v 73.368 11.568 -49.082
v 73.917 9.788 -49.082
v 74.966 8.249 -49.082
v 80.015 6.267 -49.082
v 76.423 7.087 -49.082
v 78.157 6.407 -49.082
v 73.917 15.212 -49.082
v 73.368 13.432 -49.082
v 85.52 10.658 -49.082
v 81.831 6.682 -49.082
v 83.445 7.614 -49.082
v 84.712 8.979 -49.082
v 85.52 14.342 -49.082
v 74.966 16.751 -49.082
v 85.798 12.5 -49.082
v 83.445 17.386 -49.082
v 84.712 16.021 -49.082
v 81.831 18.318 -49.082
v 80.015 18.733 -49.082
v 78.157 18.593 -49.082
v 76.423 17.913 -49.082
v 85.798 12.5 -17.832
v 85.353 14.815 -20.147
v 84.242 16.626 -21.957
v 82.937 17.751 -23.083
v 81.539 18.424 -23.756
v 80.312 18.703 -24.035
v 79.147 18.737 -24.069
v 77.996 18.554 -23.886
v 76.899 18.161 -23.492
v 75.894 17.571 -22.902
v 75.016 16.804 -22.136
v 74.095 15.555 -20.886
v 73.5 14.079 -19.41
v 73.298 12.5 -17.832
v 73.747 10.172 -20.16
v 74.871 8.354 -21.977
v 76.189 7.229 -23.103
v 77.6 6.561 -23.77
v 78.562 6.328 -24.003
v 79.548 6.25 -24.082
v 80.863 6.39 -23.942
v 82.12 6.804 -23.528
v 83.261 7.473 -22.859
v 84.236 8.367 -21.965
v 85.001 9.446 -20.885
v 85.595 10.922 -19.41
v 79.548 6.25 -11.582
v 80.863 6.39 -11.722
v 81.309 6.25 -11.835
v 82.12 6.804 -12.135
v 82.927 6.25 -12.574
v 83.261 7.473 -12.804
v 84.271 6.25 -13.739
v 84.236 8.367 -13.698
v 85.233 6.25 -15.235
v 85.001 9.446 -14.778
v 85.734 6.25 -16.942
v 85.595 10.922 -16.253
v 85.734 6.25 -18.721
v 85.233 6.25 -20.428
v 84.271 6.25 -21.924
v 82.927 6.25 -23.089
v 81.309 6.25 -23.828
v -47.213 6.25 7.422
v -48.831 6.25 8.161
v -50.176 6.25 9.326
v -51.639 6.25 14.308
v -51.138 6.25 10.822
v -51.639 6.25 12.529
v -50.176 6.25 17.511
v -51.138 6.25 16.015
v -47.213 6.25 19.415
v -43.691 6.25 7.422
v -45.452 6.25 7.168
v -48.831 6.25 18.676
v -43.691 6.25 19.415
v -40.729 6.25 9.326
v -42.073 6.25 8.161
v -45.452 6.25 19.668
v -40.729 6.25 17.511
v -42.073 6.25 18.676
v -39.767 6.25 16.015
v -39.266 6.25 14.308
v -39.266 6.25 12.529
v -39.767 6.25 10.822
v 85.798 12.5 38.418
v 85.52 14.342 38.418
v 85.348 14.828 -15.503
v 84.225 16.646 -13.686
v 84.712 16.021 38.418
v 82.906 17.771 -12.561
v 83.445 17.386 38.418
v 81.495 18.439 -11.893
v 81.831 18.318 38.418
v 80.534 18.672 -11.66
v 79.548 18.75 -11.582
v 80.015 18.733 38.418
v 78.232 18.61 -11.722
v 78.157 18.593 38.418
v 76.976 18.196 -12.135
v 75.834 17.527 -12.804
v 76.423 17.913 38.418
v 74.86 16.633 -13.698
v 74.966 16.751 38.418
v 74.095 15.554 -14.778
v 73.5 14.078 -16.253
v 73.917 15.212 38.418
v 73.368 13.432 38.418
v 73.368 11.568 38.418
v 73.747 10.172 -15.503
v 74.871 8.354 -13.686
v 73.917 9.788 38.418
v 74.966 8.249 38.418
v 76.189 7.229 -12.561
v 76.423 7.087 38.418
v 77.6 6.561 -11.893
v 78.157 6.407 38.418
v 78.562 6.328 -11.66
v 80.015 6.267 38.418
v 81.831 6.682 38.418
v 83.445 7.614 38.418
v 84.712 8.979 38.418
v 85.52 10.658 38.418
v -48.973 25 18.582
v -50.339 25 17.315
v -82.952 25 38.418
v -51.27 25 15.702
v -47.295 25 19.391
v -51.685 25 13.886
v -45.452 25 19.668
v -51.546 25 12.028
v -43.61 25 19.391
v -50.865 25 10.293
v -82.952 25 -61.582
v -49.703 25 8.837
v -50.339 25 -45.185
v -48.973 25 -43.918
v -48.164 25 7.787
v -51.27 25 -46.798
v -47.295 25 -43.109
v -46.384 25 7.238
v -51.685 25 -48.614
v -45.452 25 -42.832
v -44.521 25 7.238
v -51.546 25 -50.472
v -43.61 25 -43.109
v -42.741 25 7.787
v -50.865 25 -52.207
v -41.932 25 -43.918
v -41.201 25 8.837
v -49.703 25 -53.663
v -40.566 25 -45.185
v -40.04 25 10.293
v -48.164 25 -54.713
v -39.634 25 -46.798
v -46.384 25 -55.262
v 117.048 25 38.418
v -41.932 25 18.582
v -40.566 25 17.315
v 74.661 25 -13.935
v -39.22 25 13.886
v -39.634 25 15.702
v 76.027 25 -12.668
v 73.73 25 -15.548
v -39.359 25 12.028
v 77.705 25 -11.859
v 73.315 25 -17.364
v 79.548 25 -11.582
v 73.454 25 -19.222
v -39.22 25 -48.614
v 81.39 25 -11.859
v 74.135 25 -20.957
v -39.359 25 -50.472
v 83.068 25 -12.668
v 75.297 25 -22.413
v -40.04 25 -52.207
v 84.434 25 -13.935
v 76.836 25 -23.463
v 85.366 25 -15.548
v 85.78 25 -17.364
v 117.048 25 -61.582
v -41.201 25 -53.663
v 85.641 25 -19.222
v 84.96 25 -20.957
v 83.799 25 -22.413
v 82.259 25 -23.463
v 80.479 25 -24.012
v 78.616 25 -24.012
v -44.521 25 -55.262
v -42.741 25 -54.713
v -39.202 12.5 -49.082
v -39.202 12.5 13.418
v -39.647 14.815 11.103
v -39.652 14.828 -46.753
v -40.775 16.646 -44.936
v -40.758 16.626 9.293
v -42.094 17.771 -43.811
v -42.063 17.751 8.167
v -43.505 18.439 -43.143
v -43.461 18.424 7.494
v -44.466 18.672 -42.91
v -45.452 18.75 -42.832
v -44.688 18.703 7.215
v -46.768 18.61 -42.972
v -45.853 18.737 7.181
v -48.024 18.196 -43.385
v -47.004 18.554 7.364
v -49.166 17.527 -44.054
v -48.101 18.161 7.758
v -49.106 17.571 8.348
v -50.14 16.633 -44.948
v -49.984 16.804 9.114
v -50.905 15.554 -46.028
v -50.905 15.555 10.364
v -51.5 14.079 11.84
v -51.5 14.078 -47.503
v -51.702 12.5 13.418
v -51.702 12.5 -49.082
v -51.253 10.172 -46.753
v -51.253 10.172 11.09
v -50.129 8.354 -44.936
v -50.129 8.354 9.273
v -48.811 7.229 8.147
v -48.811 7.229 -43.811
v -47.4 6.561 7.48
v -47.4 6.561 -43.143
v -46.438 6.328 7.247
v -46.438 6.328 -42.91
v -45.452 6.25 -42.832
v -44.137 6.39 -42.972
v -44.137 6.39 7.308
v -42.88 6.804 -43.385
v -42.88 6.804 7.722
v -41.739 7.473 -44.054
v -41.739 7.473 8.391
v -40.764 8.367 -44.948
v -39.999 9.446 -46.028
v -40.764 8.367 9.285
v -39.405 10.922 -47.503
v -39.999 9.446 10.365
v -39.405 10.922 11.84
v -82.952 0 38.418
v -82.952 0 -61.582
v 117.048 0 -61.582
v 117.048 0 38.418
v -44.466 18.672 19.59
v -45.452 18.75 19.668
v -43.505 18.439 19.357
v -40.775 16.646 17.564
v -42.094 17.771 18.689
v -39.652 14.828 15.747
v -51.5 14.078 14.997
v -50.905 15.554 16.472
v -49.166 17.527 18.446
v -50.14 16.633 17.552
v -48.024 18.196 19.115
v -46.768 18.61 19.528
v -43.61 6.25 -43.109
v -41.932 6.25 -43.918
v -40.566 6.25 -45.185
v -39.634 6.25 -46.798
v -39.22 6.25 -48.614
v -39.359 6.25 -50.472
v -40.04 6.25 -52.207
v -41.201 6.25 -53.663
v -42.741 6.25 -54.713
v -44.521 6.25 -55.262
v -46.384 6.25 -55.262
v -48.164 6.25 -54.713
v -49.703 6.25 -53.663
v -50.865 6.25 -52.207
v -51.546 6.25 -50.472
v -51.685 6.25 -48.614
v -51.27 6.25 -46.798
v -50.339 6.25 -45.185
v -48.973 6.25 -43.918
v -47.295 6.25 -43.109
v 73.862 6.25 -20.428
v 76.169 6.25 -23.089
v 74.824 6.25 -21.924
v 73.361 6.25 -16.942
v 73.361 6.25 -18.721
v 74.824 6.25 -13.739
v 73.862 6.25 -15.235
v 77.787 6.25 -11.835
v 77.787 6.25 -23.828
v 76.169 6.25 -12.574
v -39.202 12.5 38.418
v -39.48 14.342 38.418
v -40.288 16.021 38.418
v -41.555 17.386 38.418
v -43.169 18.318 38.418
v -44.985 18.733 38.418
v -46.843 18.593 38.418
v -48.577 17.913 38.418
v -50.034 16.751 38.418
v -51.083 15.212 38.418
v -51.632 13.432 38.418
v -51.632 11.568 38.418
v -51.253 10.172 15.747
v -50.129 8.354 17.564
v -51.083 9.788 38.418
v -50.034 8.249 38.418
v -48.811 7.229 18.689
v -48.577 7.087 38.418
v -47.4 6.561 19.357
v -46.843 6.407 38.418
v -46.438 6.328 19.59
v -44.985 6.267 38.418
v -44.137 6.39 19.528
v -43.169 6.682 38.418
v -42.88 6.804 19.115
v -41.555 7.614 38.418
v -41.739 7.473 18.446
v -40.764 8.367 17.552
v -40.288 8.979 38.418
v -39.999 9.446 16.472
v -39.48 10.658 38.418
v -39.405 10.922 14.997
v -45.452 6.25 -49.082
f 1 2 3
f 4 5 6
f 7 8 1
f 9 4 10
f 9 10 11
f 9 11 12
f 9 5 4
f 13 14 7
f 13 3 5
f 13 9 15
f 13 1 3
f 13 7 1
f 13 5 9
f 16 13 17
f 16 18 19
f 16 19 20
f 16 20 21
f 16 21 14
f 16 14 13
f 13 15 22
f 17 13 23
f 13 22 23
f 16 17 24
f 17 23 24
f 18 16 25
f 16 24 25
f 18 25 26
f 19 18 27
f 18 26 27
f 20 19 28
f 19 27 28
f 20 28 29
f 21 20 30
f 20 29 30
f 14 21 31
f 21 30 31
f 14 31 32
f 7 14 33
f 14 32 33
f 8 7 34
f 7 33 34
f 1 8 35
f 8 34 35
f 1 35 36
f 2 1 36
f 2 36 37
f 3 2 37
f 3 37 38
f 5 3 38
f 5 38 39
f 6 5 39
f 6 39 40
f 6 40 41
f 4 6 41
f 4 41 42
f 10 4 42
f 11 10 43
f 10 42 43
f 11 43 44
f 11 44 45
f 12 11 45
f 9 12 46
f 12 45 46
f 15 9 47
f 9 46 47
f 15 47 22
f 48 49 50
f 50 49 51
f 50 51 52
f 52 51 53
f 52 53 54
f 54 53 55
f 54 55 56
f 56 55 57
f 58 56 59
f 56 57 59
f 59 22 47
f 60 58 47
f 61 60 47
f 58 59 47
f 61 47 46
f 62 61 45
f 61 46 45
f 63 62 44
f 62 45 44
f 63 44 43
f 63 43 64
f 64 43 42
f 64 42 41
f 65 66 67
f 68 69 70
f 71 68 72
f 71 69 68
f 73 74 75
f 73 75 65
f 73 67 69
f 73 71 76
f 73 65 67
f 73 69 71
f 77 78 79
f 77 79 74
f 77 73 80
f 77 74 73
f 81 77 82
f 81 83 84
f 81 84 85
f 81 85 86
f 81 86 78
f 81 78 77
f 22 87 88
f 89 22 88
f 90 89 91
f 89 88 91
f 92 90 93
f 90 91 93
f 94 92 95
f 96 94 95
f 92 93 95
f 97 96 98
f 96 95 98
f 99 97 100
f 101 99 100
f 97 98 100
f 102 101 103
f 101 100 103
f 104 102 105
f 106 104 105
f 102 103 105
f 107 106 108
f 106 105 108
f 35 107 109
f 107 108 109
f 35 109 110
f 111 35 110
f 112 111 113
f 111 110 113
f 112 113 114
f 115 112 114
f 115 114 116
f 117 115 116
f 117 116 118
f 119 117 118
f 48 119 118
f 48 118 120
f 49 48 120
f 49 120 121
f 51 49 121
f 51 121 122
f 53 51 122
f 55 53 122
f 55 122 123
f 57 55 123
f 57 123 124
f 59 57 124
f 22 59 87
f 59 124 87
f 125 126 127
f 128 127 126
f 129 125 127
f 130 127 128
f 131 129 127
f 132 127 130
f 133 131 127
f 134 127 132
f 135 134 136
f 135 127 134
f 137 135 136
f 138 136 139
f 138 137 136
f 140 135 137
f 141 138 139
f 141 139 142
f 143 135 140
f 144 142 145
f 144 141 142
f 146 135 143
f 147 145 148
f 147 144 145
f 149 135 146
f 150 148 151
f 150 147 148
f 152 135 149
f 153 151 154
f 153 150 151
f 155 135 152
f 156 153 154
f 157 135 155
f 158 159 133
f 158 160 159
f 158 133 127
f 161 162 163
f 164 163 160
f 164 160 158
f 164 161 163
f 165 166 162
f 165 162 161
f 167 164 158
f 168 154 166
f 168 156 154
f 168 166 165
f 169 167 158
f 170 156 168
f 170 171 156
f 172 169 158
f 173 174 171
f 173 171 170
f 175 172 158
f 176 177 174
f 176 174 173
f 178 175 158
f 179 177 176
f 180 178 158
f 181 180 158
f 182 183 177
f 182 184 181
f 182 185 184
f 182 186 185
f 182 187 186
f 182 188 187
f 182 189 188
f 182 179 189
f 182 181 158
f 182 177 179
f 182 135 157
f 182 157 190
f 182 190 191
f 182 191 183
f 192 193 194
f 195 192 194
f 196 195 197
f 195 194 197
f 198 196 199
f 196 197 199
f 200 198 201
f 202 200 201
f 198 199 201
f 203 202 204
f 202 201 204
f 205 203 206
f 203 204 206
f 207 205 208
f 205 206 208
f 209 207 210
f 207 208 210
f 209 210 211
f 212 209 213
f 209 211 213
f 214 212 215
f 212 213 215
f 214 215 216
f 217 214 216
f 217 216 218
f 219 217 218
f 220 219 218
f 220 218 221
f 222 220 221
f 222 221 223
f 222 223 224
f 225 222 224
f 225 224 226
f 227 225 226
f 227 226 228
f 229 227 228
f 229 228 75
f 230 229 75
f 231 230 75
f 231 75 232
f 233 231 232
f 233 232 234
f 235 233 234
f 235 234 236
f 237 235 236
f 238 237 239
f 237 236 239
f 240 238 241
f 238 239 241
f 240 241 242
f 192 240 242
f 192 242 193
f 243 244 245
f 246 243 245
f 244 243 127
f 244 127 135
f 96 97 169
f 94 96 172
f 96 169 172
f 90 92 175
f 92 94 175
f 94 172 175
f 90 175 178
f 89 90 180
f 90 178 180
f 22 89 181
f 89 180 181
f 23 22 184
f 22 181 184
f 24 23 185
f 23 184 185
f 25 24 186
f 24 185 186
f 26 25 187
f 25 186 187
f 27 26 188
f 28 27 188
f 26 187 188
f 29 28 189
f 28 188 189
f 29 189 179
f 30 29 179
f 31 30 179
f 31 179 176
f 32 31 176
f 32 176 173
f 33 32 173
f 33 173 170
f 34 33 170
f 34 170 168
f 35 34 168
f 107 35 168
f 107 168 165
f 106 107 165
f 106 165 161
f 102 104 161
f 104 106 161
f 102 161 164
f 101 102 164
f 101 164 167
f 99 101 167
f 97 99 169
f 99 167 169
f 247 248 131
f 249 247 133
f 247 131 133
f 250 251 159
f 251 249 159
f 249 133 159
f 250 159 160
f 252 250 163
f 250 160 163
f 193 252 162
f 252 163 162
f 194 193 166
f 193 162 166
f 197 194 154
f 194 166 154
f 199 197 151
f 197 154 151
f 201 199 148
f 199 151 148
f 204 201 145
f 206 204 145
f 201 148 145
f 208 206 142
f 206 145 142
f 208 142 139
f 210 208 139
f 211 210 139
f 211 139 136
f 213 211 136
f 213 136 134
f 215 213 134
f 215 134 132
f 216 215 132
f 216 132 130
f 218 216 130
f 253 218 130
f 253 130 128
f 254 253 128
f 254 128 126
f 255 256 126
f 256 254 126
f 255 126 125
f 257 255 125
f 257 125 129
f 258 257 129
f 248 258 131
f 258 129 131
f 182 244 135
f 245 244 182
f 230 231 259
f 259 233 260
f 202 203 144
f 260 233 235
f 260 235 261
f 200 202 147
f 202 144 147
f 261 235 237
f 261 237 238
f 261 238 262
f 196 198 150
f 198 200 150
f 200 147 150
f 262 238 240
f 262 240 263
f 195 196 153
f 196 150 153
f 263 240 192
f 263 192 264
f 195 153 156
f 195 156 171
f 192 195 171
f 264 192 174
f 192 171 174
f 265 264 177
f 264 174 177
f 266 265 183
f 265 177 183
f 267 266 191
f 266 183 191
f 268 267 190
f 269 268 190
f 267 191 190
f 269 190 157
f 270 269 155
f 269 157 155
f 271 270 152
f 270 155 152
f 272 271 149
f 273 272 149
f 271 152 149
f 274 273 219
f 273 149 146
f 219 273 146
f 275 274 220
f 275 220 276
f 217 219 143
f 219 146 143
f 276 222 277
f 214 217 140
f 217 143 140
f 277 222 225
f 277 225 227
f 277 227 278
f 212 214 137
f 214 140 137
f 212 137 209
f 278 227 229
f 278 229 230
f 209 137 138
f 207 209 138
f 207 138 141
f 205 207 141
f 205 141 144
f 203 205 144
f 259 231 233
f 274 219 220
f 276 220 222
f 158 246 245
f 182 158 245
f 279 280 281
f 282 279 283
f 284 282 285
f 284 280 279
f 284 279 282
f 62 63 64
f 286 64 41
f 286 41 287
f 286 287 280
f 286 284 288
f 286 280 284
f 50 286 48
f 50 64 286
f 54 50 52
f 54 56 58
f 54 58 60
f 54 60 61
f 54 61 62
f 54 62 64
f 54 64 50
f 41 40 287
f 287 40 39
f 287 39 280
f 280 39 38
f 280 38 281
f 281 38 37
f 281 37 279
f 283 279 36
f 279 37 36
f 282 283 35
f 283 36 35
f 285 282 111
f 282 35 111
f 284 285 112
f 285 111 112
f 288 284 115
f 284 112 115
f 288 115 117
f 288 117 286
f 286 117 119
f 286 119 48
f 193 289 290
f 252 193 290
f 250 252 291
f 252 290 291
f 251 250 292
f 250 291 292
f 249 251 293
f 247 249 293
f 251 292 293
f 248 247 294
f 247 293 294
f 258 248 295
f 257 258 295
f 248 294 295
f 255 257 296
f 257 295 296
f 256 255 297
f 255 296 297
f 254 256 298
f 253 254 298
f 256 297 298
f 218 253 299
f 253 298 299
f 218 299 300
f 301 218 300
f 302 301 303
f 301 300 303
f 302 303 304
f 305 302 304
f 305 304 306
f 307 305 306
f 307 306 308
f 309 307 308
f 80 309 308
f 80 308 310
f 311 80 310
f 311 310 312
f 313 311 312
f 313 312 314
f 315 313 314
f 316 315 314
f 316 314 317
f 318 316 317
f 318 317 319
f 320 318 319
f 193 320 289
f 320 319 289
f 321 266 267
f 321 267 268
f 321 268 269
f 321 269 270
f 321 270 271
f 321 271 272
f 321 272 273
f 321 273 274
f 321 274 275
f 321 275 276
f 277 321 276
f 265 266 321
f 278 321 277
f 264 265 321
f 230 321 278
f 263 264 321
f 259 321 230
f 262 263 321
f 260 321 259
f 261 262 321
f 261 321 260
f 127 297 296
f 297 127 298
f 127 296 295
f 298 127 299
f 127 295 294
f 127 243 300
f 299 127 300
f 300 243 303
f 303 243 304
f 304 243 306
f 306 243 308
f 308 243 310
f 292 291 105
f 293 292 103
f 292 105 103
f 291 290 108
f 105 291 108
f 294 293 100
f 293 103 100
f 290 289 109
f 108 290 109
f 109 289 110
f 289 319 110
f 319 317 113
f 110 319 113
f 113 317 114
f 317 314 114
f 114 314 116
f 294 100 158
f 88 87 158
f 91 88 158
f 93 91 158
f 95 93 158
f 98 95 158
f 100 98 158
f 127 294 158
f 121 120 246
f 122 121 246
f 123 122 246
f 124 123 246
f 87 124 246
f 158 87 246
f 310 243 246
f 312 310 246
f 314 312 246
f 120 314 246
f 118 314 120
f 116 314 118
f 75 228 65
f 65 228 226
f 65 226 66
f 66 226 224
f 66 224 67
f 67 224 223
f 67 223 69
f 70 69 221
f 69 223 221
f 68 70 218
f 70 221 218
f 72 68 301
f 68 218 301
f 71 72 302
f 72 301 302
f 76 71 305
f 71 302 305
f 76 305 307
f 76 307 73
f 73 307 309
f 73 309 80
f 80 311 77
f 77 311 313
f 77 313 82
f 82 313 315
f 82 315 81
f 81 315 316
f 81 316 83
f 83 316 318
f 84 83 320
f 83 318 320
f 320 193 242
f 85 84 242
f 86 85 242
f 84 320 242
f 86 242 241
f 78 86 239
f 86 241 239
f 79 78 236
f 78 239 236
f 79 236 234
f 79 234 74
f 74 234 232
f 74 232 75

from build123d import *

# Parameters (mm, degrees)
SKETCH1_W           = 200
SKETCH1_H           = 100
BOSS_EXTRUDE1_DEPTH = 25
SKETCH2_R           = 6.25
CUT_EXTRUDE1_DEPTH  = 87.5
SKETCH3_R           = 6.25
CUT_EXTRUDE2_DEPTH  = 18.75


with BuildPart() as part:
    # Sketch1 → Boss-Extrude1 (new body)
    with BuildSketch(Plane(origin=(0, 0, 0), x_dir=(1, 0, 0), z_dir=(0, 1, 0))):
        with Locations((17.047695894, 11.5815341)):
            Rectangle(SKETCH1_W, SKETCH1_H)
    extrude(amount=BOSS_EXTRUDE1_DEPTH)

    # Sketch2 → Cut-Extrude1 (cut)
    with BuildSketch(Plane.XY.offset(38.4184659)):
        with Locations((-45.452304106, 12.5)):
            Circle(SKETCH2_R)
        with Locations((79.547695894, 12.5)):
            Circle(SKETCH2_R)
    extrude(amount=-CUT_EXTRUDE1_DEPTH, mode=Mode.SUBTRACT)

    # Sketch3 → Cut-Extrude2 (cut)
    with BuildSketch(Plane(origin=(0, 25, 0), x_dir=(1, 0, 0), z_dir=(0, 1, 0))):
        with Locations(Location((-45.452304106, -13.4184659, 0), (0, 0, 270))):
            Circle(SKETCH3_R)
        with Locations(Location((-45.452304106, 49.0815341, 0), (0, 0, 270))):
            Circle(SKETCH3_R)
        with Locations(Location((79.547695894, 17.8315341, 0), (0, 0, 270))):
            Circle(SKETCH3_R)
    extrude(amount=-CUT_EXTRUDE2_DEPTH, mode=Mode.SUBTRACT)


solid = part.part
